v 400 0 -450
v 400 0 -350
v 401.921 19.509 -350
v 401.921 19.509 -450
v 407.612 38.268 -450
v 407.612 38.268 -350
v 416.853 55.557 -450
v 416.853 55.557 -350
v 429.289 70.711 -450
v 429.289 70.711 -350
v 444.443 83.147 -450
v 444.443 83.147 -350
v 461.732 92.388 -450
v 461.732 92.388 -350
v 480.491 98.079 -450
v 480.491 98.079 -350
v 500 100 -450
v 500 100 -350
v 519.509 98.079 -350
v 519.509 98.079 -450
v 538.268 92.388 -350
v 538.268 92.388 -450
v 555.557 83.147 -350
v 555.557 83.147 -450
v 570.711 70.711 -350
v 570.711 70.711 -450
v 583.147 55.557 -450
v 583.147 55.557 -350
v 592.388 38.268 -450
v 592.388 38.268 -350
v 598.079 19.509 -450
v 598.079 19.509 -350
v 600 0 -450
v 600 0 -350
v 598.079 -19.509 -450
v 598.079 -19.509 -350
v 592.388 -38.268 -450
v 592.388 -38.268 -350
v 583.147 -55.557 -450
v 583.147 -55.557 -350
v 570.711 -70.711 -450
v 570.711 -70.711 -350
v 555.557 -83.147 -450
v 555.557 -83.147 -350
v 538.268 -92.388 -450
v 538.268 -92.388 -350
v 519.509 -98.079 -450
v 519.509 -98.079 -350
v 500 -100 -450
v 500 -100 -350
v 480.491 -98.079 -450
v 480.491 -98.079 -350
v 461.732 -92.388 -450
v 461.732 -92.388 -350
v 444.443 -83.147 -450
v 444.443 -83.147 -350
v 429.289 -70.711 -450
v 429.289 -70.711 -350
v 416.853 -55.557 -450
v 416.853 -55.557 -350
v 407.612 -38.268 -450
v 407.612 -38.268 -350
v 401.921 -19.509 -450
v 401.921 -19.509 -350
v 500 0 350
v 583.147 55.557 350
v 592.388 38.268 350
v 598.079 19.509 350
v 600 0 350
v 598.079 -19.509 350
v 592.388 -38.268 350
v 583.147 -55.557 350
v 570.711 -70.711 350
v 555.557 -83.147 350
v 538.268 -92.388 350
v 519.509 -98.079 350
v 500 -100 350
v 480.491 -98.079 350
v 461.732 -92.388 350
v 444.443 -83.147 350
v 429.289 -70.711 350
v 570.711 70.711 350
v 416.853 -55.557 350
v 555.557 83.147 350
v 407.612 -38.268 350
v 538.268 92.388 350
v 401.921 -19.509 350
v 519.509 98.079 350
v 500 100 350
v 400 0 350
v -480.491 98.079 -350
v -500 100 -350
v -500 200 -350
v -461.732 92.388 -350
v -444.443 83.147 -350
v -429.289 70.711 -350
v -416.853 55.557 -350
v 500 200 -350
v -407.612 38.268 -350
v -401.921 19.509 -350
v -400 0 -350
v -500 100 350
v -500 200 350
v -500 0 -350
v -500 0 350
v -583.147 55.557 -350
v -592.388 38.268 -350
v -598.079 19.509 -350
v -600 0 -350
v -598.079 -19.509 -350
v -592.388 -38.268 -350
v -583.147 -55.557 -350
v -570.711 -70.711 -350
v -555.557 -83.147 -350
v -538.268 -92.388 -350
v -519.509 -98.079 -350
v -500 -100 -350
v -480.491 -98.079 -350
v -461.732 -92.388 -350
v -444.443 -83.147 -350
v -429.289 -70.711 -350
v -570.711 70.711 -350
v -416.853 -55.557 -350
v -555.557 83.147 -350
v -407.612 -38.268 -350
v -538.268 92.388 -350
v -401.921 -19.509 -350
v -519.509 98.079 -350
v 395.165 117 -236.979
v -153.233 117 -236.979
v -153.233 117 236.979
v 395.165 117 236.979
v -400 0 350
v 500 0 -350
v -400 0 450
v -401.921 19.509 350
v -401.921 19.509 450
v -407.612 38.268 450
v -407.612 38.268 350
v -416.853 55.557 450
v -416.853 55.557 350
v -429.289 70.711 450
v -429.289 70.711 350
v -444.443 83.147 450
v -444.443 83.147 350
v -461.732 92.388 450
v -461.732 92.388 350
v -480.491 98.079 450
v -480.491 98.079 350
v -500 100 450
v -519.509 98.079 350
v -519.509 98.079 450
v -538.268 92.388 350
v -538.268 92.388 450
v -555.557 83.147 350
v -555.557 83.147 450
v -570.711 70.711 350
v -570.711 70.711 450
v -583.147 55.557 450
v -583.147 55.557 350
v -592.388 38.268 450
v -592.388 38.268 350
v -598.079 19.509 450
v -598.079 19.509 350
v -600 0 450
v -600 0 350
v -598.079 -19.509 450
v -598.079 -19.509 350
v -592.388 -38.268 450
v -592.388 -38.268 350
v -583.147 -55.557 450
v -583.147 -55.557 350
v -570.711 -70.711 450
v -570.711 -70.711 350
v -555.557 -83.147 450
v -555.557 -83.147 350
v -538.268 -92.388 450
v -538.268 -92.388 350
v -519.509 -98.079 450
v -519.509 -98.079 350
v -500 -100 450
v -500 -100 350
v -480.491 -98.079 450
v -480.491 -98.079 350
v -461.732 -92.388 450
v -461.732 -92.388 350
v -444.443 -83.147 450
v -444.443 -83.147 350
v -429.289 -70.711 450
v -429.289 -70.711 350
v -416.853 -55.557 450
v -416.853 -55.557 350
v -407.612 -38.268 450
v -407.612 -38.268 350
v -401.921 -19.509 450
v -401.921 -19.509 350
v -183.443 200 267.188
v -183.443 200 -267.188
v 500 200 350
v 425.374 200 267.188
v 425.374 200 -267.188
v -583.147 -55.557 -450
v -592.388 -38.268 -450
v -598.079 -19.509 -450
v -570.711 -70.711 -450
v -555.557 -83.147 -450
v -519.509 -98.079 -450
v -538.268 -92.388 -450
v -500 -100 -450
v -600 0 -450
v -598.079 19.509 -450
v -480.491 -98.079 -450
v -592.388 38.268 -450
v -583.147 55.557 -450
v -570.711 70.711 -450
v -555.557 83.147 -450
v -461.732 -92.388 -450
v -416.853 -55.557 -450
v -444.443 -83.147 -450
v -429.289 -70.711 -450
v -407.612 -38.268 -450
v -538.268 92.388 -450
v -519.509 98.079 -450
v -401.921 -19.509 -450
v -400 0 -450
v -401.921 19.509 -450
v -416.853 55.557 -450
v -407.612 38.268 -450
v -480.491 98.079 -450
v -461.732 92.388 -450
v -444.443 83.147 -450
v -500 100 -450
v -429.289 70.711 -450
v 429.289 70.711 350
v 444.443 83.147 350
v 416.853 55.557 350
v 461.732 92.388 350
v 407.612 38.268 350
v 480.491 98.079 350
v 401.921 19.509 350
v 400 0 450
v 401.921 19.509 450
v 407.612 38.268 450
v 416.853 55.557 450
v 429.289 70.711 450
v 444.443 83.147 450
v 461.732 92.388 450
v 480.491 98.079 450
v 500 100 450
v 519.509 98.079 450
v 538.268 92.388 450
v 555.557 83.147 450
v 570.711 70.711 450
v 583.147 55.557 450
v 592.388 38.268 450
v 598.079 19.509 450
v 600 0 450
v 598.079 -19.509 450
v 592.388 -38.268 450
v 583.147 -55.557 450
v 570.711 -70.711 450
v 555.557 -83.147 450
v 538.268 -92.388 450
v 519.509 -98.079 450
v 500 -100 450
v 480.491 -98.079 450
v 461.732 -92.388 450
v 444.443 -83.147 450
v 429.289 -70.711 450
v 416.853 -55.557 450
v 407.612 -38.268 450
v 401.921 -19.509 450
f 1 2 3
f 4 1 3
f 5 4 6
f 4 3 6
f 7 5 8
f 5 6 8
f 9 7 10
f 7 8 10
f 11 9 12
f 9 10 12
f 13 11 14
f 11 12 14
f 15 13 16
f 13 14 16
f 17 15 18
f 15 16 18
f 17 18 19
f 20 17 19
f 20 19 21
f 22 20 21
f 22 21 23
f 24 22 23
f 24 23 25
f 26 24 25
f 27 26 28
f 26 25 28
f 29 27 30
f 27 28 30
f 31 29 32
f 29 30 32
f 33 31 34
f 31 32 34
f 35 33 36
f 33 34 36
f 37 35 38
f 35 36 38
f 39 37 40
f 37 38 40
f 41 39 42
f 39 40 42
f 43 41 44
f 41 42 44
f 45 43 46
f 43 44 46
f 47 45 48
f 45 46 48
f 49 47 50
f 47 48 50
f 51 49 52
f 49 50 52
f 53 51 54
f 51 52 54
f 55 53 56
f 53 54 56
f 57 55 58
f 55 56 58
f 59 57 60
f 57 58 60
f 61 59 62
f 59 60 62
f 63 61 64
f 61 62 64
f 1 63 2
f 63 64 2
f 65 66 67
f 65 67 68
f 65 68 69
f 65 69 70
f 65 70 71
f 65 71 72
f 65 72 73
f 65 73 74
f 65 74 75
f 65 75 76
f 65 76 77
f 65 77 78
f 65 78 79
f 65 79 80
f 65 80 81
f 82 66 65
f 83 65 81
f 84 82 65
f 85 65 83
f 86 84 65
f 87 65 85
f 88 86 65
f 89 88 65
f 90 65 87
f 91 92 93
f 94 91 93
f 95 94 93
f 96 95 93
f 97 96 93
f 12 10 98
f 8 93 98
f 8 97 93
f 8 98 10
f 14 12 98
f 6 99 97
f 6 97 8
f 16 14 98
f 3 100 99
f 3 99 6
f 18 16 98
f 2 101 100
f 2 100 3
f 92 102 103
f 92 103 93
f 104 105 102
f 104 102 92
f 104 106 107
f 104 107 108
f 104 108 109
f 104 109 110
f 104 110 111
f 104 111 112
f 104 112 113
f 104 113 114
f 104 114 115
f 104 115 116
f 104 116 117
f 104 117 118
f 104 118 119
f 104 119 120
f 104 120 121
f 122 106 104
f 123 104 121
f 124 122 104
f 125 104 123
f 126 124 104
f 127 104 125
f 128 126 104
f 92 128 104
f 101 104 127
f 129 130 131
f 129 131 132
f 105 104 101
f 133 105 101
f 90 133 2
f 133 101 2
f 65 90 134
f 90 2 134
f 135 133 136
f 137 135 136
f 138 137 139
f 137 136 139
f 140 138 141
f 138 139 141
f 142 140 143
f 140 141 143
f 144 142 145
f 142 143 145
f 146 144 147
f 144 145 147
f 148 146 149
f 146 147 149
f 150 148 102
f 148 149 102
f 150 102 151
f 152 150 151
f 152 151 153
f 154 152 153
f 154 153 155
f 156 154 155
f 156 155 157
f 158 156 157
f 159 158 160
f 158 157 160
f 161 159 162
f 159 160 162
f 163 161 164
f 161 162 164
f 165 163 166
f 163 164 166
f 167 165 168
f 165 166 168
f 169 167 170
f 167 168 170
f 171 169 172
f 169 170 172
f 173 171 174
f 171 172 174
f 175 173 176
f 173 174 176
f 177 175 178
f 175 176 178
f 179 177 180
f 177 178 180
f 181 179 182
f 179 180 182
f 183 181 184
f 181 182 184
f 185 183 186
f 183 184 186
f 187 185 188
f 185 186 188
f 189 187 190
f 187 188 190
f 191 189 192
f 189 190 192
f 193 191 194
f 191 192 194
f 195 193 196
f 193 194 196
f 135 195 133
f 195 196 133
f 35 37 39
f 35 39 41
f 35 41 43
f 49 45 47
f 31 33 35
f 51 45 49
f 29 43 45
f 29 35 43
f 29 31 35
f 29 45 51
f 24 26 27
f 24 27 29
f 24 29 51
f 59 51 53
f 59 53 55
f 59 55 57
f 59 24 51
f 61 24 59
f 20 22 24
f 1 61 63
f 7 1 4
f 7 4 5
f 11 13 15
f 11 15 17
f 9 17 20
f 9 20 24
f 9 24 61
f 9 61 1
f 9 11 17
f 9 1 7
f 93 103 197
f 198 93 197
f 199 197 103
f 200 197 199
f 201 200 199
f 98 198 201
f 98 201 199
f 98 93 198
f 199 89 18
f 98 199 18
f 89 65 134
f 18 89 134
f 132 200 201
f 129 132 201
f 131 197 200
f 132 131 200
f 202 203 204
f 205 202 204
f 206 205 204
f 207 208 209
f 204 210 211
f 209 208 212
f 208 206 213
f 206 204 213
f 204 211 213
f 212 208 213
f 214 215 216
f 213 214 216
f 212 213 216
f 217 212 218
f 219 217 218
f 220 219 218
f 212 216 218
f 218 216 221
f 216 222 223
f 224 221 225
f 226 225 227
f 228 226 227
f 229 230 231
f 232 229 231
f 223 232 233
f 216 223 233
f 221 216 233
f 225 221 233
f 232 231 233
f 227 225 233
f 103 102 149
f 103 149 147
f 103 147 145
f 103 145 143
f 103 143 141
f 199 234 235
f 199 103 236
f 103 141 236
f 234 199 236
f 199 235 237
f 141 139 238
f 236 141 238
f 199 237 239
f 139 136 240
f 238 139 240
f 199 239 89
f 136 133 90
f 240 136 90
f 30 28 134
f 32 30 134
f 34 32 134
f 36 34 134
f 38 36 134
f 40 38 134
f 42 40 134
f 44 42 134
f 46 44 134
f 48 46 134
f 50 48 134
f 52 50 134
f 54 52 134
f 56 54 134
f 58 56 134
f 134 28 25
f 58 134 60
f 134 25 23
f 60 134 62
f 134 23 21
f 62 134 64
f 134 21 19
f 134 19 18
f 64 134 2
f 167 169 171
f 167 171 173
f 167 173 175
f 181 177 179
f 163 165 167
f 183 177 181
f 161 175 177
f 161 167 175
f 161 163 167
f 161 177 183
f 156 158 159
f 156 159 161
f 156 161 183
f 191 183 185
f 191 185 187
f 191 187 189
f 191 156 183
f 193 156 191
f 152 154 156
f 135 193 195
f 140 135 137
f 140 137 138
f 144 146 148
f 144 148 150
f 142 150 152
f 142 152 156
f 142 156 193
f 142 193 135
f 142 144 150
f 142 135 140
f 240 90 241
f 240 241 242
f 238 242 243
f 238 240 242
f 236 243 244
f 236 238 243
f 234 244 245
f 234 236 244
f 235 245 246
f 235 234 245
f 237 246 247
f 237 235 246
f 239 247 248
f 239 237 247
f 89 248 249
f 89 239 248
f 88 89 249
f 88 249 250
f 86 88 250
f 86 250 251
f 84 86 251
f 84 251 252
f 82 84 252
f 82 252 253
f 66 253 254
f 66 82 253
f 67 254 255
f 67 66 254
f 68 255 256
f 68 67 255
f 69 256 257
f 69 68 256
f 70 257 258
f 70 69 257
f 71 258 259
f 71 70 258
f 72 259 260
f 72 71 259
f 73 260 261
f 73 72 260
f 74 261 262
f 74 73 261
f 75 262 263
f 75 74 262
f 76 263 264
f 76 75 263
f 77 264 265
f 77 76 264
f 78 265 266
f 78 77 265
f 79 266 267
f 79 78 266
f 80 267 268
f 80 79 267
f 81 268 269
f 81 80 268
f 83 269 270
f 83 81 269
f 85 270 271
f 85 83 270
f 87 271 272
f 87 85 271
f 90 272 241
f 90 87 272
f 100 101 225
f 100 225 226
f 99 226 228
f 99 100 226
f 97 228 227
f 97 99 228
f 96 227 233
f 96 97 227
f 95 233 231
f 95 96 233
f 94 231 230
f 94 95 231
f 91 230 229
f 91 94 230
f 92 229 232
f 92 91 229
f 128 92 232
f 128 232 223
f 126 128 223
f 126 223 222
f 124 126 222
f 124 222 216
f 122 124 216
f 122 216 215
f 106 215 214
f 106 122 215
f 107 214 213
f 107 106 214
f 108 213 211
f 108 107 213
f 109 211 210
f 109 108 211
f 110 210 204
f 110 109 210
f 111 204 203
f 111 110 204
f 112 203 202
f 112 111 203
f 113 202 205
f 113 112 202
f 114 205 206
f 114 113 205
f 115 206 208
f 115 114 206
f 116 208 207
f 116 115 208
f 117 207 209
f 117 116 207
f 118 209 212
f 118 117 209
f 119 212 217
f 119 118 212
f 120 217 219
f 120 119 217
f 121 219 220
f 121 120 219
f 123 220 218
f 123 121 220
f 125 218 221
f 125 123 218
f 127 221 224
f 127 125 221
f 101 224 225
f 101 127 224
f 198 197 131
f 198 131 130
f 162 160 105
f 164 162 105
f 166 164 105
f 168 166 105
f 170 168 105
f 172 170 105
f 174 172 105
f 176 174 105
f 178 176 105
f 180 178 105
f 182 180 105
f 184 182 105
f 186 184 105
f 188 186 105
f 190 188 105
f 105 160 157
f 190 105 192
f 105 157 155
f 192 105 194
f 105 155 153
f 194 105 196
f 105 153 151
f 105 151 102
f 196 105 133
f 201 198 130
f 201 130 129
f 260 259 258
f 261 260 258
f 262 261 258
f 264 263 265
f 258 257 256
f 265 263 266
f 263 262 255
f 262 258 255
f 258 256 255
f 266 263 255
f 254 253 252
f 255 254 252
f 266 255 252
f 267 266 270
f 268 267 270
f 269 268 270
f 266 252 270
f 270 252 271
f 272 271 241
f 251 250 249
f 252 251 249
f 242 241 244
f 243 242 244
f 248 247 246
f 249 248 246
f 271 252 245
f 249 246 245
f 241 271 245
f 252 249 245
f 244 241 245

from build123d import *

# Parameters (mm, degrees)
SKETCH_1_W               = 1000
SKETCH_1_H               = 700
EXTRUDE_1_DEPTH          = 200
SKETCH_2_R               = 100
EXTRUDE_2_DEPTH          = 100
MIRROR_2_COPY_1_SKETCH_R = 100
MIRROR_2_COPY_1_DEPTH    = 100
SKETCH_3_W               = 608.816937559
SKETCH_3_H               = 534.376438644
CUT_EXTRUDE_1_DEPTH      = 83
CUT_EXTRUDE_1_DRAFT      = -20


with BuildPart() as part:
    # 草图1 → 凸台-拉伸1 (new body)
    with BuildSketch(Plane(origin=(0, 0, 0), x_dir=(1, 0, 0), z_dir=(0, 1, 0))):
        Rectangle(SKETCH_1_W, SKETCH_1_H)
    extrude(amount=EXTRUDE_1_DEPTH)

    # 草图2 → 凸台-拉伸2 (add)
    with BuildSketch(Plane.XY.offset(350)):
        with Locations((-500, 0)):
            Circle(SKETCH_2_R)
    extrude_2 = extrude(amount=EXTRUDE_2_DEPTH)

    # 镜向1: 凸台-拉伸2 across plane
    add(extrude_2.mirror(Plane(origin=(0, 0, 0), x_dir=(0, 0, 1), z_dir=(1, 0, 0))))

    # 镜向2: 凸台-拉伸2 across plane
    add(extrude_2.mirror(Plane.XY))

    # 镜向2 copy 1 sketch → 镜向2 copy 1 (add)
    with BuildSketch(Plane(origin=(0, 0, -350), x_dir=(-1, 0, 0), z_dir=(0, 0, -1))):
        with Locations((-500, 0)):
            Circle(MIRROR_2_COPY_1_SKETCH_R)
    extrude(amount=MIRROR_2_COPY_1_DEPTH)


with BuildPart() as cut_extrude_1_tool:
    # 草图3 → 切除-拉伸1 (with draft: the straight prism first)
    with BuildSketch(Plane(origin=(0, 200, 0), x_dir=(1, 0, 0), z_dir=(0, 1, 0))):
        with Locations((120.965810738, 0)):
            Rectangle(SKETCH_3_W, SKETCH_3_H)
    extrude(amount=-CUT_EXTRUDE_1_DEPTH)
    # 切除-拉伸1: the draft: its side faces are tilted about the plane it starts from
    cut_extrude_1_sides = [cut_extrude_1_tool.faces().sort_by_distance(p)[0] for p in [
        (120.965810738, 158.5, 267.188219322),
        (425.374279517, 158.5, 0),
        (120.965810738, 158.5, -267.188219322),
        (-183.442658042, 158.5, 0),
    ]]
    draft(cut_extrude_1_sides, Plane(origin=(0, 200, 0), x_dir=(1, 0, 0), z_dir=(0, 1, 0)), CUT_EXTRUDE_1_DRAFT)


with BuildPart() as part_1:
    add(part.part)

    # 切除-拉伸1: cut by cut_extrude_1_tool
    add(cut_extrude_1_tool.part, mode=Mode.SUBTRACT)


solid = part_1.part
